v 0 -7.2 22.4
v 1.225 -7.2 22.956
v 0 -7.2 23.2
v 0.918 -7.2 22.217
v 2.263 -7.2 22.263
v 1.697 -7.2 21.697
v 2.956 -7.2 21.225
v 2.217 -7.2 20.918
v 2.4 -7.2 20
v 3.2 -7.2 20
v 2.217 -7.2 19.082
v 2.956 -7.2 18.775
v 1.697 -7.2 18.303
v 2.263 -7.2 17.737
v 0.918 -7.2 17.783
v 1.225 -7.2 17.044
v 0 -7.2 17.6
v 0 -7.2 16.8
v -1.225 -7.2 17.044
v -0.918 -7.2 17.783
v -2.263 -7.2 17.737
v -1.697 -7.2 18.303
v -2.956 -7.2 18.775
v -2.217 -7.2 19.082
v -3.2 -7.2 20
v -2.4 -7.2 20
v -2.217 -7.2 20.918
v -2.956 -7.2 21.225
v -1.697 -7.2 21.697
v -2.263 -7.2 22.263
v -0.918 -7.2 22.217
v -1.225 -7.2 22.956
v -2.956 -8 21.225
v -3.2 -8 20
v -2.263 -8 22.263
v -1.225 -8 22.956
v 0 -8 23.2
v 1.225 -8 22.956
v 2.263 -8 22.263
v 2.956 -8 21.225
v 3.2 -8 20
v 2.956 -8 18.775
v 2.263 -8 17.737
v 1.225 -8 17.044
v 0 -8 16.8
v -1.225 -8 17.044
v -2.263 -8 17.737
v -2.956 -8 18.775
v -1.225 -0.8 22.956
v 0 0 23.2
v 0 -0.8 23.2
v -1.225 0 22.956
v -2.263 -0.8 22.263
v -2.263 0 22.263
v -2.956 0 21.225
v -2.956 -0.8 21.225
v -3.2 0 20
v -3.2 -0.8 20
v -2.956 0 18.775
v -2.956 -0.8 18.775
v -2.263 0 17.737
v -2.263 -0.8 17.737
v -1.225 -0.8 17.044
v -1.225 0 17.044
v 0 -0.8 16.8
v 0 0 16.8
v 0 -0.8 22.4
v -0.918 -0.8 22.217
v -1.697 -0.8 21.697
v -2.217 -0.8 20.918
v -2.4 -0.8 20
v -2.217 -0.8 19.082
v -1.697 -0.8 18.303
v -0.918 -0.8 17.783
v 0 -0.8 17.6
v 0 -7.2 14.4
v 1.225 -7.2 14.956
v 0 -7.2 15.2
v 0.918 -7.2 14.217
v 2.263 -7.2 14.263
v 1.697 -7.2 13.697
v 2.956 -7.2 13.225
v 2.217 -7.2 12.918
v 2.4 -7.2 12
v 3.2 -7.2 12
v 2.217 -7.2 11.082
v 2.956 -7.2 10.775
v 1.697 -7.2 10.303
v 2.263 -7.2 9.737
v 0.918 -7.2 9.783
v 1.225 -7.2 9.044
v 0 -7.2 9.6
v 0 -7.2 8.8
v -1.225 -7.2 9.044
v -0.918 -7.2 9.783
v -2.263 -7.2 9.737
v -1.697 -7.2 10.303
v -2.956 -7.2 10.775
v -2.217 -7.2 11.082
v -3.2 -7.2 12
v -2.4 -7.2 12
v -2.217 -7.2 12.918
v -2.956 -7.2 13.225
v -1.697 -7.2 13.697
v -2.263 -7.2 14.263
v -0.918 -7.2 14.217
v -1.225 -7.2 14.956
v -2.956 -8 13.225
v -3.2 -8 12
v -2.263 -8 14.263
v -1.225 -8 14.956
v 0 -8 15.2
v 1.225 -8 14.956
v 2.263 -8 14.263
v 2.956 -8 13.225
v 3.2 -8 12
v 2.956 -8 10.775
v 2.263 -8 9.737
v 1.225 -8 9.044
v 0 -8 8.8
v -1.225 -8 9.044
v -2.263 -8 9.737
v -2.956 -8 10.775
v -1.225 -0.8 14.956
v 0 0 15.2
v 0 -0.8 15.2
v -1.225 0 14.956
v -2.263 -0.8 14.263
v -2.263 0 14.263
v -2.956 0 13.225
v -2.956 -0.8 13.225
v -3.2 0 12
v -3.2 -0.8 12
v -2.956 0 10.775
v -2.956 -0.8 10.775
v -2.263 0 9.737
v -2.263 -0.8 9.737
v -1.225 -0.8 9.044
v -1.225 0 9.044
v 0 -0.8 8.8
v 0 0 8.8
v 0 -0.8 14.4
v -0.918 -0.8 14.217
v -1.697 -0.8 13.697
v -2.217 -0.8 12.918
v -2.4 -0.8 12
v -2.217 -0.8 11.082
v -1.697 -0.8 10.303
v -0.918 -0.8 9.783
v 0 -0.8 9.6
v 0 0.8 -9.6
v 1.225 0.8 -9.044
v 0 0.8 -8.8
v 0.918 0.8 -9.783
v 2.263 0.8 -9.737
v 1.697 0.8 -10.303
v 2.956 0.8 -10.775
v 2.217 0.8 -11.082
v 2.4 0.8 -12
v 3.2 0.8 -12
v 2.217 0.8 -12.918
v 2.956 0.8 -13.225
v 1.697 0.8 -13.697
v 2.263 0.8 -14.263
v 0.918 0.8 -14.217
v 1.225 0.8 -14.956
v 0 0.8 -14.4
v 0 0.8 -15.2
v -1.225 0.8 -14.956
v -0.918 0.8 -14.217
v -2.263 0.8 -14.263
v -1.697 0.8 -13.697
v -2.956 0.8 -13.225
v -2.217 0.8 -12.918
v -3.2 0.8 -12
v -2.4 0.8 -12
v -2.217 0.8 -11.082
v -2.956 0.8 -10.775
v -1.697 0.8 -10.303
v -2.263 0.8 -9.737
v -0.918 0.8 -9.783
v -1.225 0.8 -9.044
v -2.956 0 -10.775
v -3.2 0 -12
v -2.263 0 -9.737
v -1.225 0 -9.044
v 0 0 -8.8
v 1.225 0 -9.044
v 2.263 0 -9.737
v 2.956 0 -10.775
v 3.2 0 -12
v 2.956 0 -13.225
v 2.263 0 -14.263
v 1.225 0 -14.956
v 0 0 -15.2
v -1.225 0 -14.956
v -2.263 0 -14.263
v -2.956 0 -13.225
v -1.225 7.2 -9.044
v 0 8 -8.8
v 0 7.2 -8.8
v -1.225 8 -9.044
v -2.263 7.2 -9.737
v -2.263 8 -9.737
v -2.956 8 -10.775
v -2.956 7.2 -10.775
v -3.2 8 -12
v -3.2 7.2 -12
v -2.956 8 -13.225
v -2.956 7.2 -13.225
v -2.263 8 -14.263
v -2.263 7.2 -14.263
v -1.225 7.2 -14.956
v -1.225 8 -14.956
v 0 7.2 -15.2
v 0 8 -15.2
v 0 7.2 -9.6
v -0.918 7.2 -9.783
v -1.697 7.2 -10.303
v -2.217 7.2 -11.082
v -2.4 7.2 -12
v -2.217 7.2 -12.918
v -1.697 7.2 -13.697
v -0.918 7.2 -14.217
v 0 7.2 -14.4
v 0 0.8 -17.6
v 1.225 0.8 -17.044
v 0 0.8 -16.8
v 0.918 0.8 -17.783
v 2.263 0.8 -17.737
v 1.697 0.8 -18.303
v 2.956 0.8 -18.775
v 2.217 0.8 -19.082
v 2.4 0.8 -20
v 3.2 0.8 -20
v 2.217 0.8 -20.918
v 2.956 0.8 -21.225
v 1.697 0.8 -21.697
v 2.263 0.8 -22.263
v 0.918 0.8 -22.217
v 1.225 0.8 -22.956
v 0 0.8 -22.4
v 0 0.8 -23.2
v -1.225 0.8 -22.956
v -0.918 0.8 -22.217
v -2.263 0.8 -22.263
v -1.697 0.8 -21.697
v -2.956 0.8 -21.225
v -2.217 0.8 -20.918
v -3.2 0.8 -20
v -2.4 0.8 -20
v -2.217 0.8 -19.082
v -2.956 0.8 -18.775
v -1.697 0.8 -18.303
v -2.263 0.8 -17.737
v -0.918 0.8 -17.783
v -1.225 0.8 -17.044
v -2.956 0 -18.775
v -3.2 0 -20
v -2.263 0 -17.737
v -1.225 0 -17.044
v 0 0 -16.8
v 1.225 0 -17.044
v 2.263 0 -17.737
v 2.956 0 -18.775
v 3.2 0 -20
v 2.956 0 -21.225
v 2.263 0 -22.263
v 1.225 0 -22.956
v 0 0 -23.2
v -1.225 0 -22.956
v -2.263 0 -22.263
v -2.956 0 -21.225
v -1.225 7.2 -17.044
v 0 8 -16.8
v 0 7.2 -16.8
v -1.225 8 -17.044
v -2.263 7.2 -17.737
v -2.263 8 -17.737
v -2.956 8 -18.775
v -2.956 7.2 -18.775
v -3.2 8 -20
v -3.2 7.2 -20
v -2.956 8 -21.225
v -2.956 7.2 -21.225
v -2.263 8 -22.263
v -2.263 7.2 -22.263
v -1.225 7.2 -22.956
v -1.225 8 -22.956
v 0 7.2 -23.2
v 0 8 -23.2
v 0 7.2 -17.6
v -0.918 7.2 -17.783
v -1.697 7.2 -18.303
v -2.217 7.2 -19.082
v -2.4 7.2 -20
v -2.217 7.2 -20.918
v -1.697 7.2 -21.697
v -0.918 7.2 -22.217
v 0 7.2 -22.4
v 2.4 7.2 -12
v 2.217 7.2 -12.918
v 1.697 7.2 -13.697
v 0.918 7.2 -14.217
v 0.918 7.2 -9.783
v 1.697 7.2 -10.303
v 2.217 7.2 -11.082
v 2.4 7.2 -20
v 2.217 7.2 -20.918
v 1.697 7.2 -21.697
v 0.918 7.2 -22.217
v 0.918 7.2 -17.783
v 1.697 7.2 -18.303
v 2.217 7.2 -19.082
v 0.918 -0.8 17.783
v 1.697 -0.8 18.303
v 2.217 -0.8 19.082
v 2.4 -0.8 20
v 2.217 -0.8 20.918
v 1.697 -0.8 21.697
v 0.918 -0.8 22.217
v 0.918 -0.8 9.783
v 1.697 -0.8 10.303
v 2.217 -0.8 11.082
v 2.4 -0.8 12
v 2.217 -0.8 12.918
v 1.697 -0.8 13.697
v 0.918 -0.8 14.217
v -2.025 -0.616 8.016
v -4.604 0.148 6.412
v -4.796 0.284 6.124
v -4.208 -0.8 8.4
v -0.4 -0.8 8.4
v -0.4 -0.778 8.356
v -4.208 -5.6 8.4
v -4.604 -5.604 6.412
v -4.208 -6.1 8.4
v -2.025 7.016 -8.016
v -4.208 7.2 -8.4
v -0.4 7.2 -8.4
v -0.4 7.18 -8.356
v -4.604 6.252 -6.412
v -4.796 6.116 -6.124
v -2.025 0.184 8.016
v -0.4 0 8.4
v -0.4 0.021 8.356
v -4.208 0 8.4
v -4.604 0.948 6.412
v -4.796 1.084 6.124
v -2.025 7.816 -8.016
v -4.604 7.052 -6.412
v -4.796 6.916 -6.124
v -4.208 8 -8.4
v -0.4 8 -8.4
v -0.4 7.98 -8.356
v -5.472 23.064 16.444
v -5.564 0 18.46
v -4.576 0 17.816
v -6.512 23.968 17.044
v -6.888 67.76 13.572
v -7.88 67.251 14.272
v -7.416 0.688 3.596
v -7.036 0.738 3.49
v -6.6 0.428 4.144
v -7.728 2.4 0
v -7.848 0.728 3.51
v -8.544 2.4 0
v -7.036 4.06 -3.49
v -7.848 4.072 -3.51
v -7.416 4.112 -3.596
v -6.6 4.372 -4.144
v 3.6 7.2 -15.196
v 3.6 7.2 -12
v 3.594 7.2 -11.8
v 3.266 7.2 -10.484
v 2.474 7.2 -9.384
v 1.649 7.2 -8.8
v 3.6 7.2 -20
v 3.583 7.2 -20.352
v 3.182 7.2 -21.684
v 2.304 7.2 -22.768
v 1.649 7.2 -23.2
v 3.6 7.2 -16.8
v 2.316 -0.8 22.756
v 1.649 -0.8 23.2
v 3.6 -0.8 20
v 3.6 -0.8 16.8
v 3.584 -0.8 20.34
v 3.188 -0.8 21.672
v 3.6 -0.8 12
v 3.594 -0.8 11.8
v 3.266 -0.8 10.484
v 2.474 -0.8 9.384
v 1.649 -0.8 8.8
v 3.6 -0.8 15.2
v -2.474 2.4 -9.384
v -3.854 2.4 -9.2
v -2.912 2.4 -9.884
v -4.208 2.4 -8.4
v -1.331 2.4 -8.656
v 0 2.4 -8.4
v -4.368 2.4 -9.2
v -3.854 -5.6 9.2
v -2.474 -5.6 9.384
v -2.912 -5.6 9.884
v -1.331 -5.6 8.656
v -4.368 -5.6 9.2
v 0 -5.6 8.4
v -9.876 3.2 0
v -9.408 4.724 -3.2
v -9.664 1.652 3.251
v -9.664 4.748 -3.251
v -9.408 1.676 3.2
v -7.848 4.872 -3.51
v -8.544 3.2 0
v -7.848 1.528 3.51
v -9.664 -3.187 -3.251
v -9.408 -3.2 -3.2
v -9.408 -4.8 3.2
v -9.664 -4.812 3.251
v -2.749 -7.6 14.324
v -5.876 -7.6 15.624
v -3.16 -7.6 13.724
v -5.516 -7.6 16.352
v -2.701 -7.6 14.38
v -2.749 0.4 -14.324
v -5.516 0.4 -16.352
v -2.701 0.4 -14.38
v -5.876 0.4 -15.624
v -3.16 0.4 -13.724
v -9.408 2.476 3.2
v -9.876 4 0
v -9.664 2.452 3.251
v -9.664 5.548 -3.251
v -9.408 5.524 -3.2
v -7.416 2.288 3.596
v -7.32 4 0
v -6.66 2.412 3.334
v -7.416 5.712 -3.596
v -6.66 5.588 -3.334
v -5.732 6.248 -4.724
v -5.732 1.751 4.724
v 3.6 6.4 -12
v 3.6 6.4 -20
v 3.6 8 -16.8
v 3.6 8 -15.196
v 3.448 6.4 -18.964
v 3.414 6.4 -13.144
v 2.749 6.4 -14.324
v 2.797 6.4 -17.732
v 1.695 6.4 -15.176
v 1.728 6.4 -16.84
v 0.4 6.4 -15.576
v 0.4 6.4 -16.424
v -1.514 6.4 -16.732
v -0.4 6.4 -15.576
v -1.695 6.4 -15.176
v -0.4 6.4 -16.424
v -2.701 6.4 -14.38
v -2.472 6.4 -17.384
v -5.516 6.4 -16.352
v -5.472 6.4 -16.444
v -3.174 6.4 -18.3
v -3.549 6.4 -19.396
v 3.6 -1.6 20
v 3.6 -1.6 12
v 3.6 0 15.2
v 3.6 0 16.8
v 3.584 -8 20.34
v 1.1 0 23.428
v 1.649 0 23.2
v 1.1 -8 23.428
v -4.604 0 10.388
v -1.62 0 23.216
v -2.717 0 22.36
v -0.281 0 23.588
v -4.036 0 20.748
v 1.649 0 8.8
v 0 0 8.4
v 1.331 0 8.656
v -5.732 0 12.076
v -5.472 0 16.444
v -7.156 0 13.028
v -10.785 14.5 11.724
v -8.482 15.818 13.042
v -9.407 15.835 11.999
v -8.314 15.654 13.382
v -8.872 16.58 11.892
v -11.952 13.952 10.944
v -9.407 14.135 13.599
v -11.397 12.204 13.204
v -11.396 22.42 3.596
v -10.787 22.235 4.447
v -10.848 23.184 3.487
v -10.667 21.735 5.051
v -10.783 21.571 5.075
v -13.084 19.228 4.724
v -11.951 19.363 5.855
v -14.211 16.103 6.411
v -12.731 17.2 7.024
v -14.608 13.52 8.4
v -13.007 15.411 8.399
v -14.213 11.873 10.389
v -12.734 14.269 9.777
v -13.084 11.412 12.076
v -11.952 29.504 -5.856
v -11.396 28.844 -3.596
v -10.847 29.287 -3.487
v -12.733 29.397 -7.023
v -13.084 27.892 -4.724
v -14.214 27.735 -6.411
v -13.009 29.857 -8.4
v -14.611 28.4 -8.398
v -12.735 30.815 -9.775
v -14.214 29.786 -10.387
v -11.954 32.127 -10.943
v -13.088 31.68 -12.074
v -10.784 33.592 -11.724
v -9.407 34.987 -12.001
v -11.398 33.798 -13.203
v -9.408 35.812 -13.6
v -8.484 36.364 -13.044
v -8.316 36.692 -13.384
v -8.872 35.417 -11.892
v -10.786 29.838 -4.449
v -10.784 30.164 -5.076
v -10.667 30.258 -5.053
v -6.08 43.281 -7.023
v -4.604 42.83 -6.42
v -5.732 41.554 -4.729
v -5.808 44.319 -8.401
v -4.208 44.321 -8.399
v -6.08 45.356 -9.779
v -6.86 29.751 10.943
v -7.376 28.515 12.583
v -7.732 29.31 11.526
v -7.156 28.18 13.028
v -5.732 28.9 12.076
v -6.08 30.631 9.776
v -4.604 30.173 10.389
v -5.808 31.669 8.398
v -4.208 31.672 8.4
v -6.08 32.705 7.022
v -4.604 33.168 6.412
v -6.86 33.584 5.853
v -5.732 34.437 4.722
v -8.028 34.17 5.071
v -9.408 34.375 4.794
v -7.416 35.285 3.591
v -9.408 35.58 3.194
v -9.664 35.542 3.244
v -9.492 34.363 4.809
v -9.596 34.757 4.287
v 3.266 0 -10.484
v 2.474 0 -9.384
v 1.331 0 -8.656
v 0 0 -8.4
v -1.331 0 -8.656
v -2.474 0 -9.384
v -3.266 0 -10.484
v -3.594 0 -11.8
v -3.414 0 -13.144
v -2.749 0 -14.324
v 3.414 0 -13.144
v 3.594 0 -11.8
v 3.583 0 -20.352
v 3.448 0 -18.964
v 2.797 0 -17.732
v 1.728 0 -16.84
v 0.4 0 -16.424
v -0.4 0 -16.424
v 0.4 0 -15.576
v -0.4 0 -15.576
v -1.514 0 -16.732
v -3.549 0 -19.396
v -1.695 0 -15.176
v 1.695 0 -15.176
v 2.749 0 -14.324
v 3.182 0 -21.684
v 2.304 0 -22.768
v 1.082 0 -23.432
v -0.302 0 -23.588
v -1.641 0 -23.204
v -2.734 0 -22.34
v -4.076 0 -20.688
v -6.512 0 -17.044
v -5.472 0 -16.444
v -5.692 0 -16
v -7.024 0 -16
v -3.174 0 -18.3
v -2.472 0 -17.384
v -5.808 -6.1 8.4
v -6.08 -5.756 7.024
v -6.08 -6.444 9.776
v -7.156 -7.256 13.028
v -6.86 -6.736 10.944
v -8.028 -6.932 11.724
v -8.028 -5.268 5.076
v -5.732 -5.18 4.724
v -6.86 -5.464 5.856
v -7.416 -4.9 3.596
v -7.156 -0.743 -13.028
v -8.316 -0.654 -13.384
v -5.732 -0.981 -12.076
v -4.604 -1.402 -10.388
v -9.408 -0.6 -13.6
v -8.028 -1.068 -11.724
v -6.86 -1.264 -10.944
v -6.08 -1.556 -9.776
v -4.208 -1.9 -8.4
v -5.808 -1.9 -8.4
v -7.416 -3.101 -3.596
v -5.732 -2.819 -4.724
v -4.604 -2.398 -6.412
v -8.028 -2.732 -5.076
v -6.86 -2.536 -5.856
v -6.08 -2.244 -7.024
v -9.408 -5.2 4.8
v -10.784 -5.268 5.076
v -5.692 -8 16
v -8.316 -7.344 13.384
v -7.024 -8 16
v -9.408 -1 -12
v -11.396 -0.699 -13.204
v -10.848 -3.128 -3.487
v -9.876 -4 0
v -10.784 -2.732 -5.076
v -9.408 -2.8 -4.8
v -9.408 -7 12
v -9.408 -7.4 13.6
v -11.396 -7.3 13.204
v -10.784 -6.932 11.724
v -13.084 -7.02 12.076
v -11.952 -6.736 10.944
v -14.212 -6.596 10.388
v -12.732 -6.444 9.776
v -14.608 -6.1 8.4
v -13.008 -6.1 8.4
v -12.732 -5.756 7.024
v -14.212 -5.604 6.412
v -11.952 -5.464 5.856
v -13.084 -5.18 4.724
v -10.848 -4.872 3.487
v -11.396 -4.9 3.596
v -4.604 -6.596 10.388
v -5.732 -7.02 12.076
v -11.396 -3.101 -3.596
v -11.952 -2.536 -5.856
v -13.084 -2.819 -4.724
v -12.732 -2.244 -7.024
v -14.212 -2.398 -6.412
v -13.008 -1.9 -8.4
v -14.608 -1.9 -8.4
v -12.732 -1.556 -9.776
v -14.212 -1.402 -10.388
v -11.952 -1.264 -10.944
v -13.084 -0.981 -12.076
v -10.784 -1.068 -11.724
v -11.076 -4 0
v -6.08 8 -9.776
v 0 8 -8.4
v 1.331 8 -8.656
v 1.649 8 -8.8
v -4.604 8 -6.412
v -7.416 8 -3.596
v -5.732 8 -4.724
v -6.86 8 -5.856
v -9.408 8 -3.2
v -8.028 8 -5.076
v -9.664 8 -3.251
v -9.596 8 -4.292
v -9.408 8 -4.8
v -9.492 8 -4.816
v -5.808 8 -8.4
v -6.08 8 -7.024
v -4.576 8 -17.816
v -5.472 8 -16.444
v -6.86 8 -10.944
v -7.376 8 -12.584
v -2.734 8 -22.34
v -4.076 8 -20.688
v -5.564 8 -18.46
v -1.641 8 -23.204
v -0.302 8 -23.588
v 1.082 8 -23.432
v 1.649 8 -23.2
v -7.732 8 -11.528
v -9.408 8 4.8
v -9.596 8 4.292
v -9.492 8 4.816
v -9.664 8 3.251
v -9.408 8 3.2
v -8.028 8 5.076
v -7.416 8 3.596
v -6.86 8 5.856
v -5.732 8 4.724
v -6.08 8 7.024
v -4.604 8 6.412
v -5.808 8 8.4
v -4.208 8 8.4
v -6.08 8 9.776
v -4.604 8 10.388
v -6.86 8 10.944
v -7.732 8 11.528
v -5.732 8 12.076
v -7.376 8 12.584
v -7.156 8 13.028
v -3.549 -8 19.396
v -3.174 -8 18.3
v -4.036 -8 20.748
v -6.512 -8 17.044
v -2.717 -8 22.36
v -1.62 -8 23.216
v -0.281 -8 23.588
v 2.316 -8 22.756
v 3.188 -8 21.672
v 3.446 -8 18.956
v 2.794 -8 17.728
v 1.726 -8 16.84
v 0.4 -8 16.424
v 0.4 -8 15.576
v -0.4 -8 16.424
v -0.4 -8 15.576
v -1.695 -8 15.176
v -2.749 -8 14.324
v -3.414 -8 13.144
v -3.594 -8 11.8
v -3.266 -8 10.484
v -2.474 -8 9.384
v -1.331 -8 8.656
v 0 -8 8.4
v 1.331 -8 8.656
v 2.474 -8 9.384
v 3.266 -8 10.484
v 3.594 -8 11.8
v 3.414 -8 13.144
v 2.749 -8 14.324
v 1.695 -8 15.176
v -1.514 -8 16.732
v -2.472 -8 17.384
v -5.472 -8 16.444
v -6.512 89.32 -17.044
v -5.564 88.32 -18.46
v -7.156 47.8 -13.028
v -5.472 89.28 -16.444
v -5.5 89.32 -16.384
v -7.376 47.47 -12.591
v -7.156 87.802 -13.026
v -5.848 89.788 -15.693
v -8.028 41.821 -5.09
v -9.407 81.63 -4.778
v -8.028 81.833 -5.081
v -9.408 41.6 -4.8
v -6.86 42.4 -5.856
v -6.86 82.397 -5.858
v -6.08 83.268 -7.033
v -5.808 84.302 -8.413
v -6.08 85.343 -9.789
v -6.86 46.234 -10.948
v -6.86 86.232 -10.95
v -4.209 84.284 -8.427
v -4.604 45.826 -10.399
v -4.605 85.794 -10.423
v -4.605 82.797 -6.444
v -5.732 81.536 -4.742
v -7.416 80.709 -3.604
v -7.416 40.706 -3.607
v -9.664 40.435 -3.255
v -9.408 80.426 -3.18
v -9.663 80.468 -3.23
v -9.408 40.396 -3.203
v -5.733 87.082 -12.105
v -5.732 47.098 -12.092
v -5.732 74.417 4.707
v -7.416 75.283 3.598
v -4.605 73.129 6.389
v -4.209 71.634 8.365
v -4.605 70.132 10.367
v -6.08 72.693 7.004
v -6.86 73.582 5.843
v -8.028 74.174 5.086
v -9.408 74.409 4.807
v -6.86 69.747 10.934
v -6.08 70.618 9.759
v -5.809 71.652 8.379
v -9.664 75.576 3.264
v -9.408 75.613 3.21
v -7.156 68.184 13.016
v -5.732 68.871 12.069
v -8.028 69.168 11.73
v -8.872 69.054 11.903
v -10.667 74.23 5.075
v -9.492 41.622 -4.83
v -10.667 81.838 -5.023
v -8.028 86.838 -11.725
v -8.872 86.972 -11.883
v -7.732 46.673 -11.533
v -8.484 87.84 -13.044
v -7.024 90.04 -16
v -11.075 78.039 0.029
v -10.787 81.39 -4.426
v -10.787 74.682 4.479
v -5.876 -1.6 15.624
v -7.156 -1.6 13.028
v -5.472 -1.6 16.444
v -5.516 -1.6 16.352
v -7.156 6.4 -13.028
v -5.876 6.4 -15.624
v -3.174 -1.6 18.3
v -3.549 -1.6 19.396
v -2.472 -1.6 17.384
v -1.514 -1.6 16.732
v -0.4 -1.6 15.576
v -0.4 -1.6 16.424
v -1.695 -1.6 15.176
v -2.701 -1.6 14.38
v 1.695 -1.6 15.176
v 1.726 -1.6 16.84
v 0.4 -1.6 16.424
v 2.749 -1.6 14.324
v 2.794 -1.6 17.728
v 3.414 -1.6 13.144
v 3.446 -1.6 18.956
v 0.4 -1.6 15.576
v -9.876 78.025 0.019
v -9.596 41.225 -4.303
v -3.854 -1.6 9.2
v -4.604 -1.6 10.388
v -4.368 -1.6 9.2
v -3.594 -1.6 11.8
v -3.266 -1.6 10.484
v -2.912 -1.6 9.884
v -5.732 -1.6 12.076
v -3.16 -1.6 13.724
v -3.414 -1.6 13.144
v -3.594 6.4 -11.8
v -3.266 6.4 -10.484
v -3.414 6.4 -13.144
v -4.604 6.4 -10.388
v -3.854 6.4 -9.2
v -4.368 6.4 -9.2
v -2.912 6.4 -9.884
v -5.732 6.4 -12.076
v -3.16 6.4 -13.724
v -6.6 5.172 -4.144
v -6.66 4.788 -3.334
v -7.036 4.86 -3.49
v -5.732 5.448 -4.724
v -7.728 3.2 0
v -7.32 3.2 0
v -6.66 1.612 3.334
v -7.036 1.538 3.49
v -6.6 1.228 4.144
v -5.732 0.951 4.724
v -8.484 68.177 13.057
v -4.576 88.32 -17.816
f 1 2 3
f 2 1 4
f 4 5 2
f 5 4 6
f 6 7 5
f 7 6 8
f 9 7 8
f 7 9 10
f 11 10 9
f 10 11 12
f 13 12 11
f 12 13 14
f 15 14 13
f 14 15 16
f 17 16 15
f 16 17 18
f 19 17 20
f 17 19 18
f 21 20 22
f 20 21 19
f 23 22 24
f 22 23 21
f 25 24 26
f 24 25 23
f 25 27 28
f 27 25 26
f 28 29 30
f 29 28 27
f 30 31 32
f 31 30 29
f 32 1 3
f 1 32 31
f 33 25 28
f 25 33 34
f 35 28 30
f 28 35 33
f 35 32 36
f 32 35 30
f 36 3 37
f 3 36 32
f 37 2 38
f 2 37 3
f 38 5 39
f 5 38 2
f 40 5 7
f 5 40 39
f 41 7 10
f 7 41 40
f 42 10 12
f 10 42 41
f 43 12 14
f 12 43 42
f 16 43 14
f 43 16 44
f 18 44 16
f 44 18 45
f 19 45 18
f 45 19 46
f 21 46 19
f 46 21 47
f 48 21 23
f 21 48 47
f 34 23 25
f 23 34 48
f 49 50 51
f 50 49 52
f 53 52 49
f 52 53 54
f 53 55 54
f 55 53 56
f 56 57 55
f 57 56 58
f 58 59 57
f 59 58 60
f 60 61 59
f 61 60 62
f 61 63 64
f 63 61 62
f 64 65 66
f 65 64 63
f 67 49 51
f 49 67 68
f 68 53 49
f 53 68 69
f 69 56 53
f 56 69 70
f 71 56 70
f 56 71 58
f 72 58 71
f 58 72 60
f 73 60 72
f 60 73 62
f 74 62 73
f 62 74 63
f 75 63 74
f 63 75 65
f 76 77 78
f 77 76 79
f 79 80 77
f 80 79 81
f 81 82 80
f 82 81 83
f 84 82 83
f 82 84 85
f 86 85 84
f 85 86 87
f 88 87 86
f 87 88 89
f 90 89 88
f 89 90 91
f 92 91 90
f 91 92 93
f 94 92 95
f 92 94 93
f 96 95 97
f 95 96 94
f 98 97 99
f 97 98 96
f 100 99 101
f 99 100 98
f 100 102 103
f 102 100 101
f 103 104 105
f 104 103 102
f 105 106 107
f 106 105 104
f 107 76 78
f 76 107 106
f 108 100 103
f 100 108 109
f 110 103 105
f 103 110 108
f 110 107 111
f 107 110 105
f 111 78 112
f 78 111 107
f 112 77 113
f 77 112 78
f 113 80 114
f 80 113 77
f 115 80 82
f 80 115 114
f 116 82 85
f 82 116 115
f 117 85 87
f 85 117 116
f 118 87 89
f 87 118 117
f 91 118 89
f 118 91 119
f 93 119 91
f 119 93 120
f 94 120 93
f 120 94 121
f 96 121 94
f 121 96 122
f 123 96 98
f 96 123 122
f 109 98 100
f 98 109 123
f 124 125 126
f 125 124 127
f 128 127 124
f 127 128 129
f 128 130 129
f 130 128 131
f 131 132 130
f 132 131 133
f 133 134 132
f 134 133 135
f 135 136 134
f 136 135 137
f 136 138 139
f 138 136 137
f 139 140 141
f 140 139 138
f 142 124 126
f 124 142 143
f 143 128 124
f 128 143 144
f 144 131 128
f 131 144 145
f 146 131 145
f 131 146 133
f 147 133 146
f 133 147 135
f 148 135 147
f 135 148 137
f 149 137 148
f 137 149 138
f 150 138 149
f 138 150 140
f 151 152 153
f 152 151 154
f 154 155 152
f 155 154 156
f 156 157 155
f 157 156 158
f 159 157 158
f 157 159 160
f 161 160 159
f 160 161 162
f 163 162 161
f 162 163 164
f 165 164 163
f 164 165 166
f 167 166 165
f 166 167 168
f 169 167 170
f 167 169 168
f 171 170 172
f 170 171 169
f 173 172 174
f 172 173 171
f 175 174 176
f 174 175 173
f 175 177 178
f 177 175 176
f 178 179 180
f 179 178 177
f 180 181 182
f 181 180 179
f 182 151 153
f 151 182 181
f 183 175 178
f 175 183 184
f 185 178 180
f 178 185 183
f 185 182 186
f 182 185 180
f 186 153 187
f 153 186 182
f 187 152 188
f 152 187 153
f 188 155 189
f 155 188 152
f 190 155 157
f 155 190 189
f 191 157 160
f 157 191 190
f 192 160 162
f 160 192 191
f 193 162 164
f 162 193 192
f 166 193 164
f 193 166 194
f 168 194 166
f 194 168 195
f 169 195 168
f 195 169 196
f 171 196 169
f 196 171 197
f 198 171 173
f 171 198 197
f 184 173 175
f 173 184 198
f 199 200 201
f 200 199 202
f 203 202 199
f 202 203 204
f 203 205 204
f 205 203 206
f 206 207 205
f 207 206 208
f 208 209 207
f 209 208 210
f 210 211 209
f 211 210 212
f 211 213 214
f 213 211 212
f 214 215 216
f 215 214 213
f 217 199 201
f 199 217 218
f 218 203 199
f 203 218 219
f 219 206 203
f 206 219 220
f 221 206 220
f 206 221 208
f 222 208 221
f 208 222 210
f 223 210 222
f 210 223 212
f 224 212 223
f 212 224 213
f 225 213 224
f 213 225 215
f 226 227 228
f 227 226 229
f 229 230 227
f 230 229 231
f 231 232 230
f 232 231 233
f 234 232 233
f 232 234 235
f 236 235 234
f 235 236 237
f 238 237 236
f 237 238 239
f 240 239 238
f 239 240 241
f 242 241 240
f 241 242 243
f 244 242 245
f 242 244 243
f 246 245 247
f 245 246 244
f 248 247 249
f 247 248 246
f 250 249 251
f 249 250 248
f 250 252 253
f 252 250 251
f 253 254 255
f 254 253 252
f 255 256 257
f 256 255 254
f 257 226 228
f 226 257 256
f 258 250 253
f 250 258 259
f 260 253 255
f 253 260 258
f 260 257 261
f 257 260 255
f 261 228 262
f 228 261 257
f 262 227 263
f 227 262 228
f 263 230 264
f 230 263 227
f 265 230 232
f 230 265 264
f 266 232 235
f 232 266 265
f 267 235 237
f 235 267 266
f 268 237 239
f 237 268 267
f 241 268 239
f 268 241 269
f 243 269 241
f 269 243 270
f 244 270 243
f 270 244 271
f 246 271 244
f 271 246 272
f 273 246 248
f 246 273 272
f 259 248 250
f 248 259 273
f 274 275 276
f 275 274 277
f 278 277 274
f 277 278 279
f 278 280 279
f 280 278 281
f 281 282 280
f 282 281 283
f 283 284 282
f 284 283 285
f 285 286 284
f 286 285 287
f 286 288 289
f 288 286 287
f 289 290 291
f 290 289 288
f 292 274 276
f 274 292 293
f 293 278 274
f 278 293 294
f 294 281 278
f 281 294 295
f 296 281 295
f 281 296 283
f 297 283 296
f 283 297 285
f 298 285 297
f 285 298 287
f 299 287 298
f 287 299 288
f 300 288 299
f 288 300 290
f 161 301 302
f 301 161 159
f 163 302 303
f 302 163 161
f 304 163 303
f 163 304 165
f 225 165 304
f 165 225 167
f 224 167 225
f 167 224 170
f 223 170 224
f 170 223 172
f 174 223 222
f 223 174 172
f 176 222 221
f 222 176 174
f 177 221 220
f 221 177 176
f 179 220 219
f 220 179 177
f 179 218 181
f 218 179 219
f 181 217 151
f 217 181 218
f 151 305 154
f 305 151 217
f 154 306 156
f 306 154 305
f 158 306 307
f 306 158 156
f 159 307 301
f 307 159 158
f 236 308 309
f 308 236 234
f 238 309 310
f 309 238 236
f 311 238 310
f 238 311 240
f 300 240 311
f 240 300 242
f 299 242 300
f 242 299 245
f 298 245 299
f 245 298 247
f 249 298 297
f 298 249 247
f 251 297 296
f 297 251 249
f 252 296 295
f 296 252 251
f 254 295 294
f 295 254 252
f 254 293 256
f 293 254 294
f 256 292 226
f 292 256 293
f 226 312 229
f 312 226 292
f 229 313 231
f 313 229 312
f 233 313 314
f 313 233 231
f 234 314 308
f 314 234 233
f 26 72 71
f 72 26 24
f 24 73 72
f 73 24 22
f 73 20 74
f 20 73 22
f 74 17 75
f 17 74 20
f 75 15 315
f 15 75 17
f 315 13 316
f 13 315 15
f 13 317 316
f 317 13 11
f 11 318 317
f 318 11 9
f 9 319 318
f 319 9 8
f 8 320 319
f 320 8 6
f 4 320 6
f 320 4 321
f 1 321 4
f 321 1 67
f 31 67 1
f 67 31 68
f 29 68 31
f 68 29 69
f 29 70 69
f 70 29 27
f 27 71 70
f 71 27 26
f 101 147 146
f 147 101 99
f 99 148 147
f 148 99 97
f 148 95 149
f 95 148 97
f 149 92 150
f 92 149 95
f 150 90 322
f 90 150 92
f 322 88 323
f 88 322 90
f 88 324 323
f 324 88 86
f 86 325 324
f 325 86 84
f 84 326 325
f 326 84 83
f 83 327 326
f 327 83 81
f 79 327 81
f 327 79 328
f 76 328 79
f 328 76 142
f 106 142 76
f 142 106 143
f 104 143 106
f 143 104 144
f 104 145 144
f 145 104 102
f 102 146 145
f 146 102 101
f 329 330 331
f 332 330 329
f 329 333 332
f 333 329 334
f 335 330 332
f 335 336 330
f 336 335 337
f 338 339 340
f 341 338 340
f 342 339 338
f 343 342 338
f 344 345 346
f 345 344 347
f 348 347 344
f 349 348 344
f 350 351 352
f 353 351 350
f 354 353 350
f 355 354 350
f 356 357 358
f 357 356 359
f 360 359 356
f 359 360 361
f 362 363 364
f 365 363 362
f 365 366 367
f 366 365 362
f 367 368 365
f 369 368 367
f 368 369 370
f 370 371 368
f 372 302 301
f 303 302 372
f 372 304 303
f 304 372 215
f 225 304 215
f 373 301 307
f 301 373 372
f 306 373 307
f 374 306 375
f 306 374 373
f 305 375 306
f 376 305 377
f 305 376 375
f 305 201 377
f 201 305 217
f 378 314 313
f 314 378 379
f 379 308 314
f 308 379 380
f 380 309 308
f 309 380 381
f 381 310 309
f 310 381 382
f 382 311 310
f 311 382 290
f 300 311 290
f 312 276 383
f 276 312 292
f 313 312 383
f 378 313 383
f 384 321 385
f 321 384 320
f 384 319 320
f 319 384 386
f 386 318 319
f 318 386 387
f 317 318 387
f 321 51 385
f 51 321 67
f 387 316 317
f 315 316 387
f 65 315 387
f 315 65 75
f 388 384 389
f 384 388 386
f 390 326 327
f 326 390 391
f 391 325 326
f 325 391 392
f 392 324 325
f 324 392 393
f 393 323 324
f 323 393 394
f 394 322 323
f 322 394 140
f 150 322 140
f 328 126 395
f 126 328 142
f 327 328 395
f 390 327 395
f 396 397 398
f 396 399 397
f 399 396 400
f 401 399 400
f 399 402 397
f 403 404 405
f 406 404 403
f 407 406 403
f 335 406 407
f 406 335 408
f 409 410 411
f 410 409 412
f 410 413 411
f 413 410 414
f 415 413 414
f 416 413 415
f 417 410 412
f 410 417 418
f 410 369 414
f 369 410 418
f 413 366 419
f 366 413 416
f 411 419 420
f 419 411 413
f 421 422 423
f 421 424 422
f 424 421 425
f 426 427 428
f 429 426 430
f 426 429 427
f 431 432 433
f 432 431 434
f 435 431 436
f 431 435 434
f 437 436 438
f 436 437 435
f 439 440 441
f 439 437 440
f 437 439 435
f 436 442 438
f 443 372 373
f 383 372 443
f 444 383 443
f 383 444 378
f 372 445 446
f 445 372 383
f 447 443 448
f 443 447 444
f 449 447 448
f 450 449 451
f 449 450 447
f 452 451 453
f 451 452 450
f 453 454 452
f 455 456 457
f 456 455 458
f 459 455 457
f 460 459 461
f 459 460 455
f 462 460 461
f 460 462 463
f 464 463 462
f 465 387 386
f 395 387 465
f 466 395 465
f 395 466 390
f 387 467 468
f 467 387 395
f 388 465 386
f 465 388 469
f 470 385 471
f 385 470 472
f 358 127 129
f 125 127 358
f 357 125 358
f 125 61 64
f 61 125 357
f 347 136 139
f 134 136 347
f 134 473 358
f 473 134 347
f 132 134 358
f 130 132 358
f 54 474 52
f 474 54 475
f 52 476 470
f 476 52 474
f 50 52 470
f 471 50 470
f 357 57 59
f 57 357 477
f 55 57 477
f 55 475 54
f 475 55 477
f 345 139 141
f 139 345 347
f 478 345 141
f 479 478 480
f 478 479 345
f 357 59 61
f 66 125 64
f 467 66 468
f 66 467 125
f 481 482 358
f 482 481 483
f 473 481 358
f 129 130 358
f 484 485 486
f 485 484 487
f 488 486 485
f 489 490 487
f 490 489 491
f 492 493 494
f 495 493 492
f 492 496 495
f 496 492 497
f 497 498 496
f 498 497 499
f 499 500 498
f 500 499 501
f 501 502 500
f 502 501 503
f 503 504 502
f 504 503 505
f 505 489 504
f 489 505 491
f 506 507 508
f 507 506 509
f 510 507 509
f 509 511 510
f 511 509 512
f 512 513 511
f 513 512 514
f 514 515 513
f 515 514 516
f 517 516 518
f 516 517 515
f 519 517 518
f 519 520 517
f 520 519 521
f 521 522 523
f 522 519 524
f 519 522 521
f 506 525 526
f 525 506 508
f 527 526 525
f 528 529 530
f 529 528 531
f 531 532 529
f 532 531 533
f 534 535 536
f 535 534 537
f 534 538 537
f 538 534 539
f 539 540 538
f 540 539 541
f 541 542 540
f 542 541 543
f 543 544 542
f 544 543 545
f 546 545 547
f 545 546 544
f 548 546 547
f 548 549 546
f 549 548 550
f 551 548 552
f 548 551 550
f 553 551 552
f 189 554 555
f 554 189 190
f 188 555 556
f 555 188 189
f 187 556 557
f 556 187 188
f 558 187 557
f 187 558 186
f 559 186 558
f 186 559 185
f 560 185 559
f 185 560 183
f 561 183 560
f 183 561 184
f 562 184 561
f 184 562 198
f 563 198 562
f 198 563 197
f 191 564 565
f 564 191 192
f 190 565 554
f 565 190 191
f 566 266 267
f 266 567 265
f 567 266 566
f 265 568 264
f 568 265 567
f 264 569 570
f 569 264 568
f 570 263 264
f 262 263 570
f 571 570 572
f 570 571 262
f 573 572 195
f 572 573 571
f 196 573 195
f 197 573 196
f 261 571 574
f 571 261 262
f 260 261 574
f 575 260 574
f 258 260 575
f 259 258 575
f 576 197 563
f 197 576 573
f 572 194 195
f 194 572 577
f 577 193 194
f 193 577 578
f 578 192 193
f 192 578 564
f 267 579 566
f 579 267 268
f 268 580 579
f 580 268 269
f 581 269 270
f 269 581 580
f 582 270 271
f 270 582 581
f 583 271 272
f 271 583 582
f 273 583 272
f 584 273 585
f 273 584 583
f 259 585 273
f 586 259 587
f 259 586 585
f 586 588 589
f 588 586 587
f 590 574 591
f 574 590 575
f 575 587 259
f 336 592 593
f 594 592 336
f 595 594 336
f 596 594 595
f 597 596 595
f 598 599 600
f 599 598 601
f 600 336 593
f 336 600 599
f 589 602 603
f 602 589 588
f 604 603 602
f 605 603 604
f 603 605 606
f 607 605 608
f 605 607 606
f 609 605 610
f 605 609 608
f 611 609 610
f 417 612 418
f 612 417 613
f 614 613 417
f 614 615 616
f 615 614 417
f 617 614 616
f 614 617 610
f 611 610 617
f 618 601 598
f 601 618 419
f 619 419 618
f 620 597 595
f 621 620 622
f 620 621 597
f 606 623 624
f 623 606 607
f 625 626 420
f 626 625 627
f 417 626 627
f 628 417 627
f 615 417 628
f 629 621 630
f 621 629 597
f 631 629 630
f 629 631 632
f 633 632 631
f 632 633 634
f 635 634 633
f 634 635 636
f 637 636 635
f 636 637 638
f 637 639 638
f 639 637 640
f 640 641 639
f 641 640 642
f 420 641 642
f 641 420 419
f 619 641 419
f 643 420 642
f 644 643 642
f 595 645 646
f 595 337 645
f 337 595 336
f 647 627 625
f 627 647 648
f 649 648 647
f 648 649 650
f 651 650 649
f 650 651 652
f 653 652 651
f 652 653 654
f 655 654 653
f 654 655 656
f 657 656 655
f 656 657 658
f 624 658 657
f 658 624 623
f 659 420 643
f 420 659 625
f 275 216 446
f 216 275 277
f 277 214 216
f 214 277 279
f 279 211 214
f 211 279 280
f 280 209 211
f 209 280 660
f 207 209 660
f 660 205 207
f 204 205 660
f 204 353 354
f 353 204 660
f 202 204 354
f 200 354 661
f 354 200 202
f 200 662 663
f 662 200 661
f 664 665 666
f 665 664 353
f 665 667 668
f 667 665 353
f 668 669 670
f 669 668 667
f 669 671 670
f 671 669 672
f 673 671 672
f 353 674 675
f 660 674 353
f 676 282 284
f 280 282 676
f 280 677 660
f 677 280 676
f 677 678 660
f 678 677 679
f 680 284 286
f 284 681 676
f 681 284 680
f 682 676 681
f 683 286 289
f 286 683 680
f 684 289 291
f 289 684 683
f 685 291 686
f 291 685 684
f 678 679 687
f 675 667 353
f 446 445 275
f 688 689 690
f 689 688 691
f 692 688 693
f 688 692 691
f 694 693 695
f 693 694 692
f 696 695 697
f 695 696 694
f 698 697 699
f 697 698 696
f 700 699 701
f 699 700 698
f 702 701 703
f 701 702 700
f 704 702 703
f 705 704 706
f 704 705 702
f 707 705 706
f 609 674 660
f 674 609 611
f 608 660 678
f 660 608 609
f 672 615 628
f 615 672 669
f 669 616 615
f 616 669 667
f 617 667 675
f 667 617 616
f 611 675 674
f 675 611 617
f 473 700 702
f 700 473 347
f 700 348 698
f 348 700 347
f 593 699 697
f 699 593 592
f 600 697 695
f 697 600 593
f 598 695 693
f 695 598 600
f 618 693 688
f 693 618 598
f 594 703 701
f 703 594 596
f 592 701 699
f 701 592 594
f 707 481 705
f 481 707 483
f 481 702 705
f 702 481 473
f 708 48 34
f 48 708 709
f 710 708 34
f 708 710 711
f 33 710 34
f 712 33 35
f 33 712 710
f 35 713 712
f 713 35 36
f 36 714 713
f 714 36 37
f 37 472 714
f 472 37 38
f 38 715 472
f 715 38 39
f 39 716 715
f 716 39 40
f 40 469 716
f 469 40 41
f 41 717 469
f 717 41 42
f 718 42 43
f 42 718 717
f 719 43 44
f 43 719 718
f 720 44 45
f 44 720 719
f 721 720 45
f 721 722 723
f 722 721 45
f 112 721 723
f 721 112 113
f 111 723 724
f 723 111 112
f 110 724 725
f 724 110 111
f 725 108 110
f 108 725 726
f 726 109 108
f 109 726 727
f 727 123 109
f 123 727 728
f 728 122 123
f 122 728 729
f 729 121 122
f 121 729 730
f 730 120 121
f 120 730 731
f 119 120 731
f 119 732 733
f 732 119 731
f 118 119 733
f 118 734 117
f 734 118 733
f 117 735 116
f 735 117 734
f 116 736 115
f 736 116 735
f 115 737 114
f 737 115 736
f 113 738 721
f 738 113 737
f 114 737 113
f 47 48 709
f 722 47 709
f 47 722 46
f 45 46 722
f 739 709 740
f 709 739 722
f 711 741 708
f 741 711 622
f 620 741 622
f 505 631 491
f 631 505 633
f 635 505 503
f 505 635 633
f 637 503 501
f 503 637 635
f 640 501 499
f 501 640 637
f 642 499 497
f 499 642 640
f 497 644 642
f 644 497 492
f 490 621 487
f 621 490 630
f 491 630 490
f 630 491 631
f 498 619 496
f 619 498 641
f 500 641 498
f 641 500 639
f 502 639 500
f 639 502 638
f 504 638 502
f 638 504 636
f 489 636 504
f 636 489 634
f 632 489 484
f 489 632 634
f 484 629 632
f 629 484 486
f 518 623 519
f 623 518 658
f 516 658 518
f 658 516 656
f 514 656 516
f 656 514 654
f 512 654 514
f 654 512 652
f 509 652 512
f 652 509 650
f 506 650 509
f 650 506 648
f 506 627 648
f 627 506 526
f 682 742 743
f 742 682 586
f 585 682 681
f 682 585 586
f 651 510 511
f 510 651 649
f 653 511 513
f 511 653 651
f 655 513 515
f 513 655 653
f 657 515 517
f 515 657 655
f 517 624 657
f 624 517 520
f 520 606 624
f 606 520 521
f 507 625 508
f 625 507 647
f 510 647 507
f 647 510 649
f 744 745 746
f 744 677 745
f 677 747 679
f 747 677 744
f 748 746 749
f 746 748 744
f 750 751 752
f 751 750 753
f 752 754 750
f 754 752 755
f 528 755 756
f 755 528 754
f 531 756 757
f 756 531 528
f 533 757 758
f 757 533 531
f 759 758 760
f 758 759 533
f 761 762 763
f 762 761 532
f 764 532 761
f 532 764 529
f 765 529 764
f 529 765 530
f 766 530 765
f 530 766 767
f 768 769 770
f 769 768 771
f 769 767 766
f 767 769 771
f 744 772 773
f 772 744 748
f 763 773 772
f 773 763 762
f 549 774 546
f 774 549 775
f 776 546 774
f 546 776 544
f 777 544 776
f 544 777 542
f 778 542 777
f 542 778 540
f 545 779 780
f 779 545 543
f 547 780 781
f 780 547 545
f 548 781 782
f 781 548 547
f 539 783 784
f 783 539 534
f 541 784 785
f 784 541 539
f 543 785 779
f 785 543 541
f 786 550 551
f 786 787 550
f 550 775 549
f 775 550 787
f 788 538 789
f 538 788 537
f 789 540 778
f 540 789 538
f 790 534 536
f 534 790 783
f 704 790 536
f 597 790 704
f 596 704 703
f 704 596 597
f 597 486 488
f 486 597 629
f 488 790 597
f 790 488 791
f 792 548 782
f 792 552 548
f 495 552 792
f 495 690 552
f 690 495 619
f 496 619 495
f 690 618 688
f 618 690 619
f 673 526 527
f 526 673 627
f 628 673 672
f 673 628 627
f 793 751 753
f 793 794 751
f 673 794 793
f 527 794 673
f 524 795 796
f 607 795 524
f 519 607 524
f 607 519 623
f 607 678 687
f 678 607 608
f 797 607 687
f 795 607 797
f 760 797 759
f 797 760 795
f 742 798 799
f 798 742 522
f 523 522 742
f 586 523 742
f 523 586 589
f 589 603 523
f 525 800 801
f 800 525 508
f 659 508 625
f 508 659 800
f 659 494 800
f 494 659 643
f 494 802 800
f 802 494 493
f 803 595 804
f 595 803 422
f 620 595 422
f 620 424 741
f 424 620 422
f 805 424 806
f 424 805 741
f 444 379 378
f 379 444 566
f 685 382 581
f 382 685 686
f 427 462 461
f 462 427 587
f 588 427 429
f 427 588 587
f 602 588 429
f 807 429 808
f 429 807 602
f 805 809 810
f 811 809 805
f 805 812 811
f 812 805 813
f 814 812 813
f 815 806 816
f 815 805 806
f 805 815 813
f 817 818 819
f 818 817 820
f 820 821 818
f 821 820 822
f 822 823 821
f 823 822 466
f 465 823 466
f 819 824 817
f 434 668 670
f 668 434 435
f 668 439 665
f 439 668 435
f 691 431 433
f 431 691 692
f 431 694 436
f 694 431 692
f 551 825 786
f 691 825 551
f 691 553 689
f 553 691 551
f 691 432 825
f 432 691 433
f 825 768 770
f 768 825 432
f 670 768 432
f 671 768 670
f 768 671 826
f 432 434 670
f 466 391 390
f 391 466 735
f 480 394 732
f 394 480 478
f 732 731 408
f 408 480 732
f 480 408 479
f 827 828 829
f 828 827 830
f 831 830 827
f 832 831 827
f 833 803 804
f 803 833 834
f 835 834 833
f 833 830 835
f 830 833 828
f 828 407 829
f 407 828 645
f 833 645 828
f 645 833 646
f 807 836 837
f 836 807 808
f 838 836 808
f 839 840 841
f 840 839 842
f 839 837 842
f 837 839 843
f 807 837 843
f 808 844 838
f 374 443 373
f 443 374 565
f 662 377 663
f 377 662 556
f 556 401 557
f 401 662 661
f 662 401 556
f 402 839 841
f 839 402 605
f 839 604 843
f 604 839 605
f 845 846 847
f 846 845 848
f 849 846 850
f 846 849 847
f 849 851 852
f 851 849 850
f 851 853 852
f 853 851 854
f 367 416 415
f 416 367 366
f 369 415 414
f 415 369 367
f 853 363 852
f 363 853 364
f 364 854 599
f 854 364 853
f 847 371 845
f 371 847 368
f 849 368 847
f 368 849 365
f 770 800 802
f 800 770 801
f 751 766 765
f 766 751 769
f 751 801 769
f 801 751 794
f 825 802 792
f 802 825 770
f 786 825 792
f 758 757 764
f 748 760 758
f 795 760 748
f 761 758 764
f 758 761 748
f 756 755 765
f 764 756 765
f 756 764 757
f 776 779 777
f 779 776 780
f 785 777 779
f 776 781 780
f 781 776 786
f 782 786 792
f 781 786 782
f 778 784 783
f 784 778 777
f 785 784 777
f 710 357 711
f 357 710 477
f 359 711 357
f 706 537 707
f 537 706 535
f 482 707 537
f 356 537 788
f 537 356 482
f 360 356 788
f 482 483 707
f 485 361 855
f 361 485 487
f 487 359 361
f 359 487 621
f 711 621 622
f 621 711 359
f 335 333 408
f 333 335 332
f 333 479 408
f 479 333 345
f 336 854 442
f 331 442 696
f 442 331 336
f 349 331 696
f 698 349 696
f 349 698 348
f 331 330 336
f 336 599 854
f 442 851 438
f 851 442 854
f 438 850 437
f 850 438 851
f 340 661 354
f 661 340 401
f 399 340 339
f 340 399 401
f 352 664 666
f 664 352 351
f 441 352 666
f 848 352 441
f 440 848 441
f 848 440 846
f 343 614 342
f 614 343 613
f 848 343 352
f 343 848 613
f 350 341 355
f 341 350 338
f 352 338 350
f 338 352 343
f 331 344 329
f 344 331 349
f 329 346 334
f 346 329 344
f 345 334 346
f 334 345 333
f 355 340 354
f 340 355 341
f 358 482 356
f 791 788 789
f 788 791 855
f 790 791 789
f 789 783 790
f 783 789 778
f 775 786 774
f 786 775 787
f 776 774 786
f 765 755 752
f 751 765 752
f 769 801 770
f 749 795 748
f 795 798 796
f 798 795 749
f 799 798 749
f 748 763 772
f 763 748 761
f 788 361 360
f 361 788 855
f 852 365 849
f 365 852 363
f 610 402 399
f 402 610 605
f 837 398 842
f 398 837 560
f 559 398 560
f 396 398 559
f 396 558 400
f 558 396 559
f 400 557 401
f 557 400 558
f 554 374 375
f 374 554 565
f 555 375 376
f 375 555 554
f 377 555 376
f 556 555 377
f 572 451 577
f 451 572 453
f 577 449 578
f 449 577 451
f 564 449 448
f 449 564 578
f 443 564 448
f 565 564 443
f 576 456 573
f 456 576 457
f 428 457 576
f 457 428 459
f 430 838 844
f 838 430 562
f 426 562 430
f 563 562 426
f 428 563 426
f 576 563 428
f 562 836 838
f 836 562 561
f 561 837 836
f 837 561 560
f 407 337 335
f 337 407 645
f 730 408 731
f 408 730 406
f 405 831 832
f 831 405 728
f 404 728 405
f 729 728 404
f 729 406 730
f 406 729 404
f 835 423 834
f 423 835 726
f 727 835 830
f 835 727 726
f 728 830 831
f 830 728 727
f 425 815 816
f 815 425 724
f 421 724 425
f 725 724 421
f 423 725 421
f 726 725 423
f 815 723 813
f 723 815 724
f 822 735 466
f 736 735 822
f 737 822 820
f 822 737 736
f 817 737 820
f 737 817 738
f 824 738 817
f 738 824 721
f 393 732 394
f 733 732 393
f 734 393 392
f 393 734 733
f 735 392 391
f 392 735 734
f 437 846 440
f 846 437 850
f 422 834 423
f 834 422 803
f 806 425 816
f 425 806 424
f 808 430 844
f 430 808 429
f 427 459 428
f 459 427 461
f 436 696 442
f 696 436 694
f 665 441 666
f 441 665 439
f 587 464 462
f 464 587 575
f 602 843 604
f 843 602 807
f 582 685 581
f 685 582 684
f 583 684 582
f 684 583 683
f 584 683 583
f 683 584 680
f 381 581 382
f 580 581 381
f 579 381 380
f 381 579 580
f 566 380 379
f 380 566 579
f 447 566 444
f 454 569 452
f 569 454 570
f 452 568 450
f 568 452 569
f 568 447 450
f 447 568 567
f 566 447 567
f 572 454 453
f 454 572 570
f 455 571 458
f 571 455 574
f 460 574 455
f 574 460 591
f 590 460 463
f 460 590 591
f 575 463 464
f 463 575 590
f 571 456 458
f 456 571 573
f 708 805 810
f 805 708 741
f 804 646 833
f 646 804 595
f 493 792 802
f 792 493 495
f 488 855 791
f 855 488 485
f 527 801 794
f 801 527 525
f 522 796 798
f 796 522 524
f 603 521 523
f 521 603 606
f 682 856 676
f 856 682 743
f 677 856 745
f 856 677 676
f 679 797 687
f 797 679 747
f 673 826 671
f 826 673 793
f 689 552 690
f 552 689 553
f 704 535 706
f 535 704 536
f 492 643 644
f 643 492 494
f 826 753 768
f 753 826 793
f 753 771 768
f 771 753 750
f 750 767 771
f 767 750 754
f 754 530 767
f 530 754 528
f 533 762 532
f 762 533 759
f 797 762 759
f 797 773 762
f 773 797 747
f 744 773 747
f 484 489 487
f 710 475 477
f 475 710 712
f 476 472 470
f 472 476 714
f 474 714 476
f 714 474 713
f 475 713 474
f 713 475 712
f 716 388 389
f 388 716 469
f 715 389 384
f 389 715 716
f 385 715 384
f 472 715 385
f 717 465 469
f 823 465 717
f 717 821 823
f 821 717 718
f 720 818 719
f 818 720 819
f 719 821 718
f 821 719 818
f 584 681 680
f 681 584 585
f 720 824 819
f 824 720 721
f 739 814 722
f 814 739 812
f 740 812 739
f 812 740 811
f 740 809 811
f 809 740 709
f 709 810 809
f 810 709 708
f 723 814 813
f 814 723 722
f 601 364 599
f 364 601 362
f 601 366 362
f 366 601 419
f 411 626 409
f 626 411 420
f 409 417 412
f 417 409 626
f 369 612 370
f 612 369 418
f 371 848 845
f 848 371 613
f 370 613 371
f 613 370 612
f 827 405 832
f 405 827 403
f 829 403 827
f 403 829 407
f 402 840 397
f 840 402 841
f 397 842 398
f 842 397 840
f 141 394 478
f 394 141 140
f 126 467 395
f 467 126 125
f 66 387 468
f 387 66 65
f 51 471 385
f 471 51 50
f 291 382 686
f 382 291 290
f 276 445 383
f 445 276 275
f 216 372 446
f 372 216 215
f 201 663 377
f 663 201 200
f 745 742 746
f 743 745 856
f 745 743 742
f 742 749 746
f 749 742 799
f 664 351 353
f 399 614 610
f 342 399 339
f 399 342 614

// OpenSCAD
use <../lib.scad>
use <32188.scad>
function ldraw_lib__22972() = [
// 0 =Technic Panel Fairing #3
// 0 Name: 22972.dat
// 0 Author: Steve Bliss [sbliss]
// 0 !LDRAW_ORG Part Alias UPDATE 2013-02
// 0 !LICENSE Licensed under CC BY 2.0 and CC BY 4.0 : see CAreadme.txt
// 
// 0 BFC CERTIFY CCW
  [0,"BFC","CERTIFY"],
  [0,"BFC","CCW"],
// 
// 0 !HISTORY 2002-06-11 [PTadmin] Official Update 2002-03
// 0 !HISTORY 2007-10-12 [PTadmin] Header formatted for Contributor Agreement
// 0 !HISTORY 2008-07-01 [PTadmin] Official Update 2008-01
// 0 !HISTORY 2013-12-14 [cwdee] Add = prefix
// 0 !HISTORY 2013-12-23 [PTadmin] Official Update 2013-02
// 
// 
// 0 // Alias of 32188
// 1 16 0 0 0 1 0 0 0 1 0 0 0 1 32188.dat
  [1,16,0,0,0,1,0,0,0,1,0,0,0,1, ldraw_lib__32188()],
];
module ldraw_lib__22972(step=0, col=false, unit=2/5, alt=false, line=0.2, solid=!$preview)
    makepoly(ldraw_lib__22972(), step=step, col=col, unit=unit, alt=alt, line=line, solid=solid);
ldraw_lib__22972(line=0.2);
